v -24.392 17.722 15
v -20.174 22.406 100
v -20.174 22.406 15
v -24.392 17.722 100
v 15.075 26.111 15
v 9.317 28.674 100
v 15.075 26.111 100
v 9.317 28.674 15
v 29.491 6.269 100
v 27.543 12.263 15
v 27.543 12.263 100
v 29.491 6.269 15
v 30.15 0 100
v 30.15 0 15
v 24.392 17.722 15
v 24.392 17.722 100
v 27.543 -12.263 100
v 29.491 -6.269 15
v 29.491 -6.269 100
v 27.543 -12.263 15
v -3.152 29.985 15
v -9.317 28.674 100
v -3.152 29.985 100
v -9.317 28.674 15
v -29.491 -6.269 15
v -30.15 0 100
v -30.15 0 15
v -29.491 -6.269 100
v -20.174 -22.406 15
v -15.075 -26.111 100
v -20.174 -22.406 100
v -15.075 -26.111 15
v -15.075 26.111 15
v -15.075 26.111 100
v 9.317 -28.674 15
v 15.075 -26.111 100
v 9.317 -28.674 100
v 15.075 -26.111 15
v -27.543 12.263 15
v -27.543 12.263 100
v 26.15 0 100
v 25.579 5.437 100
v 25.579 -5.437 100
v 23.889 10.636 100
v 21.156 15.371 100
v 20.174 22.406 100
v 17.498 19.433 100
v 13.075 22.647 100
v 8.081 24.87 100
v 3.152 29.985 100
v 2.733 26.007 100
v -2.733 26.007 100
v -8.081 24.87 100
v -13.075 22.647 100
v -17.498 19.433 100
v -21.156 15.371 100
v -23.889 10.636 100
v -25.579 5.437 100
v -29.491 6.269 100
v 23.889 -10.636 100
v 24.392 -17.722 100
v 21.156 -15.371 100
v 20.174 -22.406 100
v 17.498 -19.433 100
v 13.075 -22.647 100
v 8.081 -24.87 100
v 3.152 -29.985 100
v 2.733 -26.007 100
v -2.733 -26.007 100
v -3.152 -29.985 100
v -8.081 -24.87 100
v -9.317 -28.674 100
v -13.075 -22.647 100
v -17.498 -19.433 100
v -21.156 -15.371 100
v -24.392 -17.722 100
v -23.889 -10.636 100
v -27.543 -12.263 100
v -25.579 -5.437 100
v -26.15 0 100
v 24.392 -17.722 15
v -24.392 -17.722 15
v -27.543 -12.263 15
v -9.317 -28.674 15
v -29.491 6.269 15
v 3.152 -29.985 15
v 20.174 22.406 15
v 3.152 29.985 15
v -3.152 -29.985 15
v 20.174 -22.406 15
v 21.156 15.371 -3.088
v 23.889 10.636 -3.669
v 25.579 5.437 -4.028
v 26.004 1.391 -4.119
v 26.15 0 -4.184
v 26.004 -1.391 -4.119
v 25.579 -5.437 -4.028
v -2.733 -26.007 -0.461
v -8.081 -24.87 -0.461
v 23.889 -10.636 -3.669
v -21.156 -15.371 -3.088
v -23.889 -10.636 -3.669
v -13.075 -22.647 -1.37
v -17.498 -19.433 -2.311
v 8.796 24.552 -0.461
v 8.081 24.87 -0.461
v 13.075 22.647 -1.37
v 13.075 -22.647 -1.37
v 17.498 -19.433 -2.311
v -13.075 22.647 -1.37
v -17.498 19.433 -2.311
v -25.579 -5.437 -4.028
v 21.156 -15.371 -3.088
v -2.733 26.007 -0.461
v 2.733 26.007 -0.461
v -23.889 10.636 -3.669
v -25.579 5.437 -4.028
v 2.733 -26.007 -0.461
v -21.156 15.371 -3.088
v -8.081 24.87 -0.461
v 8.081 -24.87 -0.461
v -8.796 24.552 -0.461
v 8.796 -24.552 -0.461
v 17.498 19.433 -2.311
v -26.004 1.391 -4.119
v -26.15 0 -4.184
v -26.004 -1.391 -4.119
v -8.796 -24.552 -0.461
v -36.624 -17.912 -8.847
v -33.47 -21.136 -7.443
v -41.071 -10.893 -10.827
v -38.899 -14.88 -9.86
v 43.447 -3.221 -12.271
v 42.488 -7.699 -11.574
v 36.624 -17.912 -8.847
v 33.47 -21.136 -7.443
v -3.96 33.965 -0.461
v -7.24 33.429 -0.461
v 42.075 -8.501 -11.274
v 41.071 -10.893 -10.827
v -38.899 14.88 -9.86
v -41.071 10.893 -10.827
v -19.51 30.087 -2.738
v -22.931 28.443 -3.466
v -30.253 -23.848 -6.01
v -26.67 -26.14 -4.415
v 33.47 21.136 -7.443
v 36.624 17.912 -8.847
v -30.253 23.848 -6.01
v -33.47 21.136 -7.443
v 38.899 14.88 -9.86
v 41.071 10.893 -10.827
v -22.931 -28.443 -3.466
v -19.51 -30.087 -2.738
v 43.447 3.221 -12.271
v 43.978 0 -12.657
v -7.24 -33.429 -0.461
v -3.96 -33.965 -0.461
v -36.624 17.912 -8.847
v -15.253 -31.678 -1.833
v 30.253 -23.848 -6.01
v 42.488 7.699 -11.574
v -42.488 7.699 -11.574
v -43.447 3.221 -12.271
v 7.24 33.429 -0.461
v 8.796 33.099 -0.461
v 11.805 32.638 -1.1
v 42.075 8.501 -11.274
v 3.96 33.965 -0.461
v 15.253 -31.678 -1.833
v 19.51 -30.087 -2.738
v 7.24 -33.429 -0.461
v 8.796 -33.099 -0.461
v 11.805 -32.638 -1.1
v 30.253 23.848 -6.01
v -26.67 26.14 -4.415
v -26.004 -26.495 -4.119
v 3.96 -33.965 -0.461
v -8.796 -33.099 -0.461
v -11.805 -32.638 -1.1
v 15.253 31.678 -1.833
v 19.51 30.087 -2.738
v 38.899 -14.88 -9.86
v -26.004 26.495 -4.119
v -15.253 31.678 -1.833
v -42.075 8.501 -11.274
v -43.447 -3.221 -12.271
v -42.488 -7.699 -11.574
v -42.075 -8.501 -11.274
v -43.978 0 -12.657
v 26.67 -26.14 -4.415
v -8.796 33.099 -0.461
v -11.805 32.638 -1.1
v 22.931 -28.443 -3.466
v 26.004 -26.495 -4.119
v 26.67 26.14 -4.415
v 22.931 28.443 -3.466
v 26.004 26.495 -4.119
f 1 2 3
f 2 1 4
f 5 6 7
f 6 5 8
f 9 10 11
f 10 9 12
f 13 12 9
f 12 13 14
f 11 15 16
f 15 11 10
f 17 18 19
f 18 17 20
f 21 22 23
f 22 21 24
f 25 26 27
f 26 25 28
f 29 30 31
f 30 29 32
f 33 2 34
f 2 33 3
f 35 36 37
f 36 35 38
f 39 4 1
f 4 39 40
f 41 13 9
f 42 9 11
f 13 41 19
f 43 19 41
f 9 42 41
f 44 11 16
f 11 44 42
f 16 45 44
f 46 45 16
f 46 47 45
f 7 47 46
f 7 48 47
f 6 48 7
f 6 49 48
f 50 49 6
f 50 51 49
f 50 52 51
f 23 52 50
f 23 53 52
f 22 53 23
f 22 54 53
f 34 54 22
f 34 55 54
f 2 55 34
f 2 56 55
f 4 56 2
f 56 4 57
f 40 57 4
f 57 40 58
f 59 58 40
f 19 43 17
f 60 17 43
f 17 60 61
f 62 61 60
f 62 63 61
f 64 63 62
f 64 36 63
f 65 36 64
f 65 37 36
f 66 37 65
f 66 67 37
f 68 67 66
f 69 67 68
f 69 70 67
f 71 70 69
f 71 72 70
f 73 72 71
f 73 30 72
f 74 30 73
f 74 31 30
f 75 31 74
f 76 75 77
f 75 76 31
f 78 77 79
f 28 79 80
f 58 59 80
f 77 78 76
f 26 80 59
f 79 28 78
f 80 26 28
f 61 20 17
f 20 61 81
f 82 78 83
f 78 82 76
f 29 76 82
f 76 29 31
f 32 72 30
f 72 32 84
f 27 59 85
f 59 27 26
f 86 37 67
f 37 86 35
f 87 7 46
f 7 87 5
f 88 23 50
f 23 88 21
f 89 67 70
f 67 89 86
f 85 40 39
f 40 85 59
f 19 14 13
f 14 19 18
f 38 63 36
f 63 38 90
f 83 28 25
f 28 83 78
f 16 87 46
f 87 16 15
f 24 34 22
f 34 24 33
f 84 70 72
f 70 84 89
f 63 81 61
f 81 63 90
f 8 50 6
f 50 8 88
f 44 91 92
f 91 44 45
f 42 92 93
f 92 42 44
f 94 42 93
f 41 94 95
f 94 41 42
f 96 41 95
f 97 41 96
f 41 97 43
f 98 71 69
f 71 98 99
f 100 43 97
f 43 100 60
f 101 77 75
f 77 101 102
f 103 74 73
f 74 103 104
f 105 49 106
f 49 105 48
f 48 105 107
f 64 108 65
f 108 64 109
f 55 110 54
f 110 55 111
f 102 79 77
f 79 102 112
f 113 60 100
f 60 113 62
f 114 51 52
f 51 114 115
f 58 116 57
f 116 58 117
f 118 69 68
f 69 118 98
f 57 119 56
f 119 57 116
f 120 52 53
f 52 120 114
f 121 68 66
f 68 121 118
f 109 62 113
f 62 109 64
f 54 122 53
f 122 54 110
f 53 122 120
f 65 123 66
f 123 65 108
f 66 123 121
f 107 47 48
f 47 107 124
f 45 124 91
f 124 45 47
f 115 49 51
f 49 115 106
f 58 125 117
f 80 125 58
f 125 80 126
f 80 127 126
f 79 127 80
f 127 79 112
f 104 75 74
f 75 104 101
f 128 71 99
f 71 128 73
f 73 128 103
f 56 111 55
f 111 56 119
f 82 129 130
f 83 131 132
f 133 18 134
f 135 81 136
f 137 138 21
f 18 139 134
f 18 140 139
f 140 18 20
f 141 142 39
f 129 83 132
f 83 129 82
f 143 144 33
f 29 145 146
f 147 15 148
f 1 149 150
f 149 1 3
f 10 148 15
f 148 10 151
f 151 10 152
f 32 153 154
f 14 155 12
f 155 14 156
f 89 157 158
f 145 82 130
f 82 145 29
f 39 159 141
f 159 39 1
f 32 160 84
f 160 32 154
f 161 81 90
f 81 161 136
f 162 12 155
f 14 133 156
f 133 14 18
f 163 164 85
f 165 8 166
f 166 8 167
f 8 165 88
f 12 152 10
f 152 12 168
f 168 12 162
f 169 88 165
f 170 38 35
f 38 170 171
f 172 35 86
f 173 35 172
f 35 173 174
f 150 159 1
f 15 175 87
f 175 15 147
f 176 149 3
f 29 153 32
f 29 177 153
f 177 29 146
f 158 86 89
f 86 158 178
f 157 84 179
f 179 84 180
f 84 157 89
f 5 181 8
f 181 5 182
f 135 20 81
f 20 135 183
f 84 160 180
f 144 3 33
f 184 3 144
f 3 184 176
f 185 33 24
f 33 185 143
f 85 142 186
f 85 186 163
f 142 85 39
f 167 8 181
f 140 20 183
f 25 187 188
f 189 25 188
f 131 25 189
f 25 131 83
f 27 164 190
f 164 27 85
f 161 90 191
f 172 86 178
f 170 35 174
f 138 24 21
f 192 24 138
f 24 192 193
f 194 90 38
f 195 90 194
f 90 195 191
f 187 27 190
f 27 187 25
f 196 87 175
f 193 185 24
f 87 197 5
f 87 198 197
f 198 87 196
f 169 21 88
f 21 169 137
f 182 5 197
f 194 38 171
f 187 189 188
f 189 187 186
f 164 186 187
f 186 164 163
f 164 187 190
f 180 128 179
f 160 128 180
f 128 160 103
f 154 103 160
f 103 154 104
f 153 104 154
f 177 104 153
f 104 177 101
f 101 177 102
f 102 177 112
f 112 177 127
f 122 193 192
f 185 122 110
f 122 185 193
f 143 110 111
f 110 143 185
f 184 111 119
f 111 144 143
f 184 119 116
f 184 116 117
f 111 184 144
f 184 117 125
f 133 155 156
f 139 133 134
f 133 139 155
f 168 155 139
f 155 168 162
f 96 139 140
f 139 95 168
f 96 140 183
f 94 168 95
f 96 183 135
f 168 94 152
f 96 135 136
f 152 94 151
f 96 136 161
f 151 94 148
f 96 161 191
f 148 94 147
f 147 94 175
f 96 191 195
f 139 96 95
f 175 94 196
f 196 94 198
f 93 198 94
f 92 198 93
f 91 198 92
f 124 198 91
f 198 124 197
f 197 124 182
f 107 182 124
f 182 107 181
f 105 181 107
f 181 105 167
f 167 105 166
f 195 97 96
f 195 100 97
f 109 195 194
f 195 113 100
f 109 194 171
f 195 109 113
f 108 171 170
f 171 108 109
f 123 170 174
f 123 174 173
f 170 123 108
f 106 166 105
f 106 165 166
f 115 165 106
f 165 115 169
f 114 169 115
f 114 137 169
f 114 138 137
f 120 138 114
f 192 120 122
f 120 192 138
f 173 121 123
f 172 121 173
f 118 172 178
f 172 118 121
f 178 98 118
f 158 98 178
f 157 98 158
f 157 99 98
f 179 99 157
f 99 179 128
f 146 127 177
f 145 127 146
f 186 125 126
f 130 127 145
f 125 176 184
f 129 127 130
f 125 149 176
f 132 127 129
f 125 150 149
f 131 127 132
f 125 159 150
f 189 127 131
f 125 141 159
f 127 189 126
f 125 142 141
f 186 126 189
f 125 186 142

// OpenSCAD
//saddle.scad
//creates a saddle based on shell and branch dimensions
//parameters:D = shell od, d = branch od, t = branch thickness, 
//a = angle of fillet along z axis, b = angle of fillet alang x axis
//==================================================================

//Example: saddle(D=168.3,d=60.3,t=4,a=30,b=15,f=5);
//saddle();

module saddle(D=168.3,d=60.3,t=4,a=30,b=15,f=15){
    
    l=D/3;  echo("l = ",l);
    m=d+2*sin(a)*l;echo(m);
    M=d+2*sin(b)*l;echo(M);

    difference(){
            translate([0,0,-f])hull(){
                cylinder(h=0.1,d=d);
               translate([0,0,l])scale([1,M/m,1])cylinder(h=0.1,d=m);
            }
            translate([0,0,D/2])
       rotate([90,0,0])cylinder(h=M+2,d=D,center=true);    //subtract shell
        cylinder(h=d+f,d=d-2*t,center=true);    //pipe bore
    }
}

branch();

module branch(d=60.3,l=100,t=4,saddle=true){
    difference(){
        cylinder(h=l,d=d);
        translate([0,0,-1])cylinder(h=l+2,d=d-2*t);
    }
    if(saddle)rotate([180,0,0])saddle();
}
